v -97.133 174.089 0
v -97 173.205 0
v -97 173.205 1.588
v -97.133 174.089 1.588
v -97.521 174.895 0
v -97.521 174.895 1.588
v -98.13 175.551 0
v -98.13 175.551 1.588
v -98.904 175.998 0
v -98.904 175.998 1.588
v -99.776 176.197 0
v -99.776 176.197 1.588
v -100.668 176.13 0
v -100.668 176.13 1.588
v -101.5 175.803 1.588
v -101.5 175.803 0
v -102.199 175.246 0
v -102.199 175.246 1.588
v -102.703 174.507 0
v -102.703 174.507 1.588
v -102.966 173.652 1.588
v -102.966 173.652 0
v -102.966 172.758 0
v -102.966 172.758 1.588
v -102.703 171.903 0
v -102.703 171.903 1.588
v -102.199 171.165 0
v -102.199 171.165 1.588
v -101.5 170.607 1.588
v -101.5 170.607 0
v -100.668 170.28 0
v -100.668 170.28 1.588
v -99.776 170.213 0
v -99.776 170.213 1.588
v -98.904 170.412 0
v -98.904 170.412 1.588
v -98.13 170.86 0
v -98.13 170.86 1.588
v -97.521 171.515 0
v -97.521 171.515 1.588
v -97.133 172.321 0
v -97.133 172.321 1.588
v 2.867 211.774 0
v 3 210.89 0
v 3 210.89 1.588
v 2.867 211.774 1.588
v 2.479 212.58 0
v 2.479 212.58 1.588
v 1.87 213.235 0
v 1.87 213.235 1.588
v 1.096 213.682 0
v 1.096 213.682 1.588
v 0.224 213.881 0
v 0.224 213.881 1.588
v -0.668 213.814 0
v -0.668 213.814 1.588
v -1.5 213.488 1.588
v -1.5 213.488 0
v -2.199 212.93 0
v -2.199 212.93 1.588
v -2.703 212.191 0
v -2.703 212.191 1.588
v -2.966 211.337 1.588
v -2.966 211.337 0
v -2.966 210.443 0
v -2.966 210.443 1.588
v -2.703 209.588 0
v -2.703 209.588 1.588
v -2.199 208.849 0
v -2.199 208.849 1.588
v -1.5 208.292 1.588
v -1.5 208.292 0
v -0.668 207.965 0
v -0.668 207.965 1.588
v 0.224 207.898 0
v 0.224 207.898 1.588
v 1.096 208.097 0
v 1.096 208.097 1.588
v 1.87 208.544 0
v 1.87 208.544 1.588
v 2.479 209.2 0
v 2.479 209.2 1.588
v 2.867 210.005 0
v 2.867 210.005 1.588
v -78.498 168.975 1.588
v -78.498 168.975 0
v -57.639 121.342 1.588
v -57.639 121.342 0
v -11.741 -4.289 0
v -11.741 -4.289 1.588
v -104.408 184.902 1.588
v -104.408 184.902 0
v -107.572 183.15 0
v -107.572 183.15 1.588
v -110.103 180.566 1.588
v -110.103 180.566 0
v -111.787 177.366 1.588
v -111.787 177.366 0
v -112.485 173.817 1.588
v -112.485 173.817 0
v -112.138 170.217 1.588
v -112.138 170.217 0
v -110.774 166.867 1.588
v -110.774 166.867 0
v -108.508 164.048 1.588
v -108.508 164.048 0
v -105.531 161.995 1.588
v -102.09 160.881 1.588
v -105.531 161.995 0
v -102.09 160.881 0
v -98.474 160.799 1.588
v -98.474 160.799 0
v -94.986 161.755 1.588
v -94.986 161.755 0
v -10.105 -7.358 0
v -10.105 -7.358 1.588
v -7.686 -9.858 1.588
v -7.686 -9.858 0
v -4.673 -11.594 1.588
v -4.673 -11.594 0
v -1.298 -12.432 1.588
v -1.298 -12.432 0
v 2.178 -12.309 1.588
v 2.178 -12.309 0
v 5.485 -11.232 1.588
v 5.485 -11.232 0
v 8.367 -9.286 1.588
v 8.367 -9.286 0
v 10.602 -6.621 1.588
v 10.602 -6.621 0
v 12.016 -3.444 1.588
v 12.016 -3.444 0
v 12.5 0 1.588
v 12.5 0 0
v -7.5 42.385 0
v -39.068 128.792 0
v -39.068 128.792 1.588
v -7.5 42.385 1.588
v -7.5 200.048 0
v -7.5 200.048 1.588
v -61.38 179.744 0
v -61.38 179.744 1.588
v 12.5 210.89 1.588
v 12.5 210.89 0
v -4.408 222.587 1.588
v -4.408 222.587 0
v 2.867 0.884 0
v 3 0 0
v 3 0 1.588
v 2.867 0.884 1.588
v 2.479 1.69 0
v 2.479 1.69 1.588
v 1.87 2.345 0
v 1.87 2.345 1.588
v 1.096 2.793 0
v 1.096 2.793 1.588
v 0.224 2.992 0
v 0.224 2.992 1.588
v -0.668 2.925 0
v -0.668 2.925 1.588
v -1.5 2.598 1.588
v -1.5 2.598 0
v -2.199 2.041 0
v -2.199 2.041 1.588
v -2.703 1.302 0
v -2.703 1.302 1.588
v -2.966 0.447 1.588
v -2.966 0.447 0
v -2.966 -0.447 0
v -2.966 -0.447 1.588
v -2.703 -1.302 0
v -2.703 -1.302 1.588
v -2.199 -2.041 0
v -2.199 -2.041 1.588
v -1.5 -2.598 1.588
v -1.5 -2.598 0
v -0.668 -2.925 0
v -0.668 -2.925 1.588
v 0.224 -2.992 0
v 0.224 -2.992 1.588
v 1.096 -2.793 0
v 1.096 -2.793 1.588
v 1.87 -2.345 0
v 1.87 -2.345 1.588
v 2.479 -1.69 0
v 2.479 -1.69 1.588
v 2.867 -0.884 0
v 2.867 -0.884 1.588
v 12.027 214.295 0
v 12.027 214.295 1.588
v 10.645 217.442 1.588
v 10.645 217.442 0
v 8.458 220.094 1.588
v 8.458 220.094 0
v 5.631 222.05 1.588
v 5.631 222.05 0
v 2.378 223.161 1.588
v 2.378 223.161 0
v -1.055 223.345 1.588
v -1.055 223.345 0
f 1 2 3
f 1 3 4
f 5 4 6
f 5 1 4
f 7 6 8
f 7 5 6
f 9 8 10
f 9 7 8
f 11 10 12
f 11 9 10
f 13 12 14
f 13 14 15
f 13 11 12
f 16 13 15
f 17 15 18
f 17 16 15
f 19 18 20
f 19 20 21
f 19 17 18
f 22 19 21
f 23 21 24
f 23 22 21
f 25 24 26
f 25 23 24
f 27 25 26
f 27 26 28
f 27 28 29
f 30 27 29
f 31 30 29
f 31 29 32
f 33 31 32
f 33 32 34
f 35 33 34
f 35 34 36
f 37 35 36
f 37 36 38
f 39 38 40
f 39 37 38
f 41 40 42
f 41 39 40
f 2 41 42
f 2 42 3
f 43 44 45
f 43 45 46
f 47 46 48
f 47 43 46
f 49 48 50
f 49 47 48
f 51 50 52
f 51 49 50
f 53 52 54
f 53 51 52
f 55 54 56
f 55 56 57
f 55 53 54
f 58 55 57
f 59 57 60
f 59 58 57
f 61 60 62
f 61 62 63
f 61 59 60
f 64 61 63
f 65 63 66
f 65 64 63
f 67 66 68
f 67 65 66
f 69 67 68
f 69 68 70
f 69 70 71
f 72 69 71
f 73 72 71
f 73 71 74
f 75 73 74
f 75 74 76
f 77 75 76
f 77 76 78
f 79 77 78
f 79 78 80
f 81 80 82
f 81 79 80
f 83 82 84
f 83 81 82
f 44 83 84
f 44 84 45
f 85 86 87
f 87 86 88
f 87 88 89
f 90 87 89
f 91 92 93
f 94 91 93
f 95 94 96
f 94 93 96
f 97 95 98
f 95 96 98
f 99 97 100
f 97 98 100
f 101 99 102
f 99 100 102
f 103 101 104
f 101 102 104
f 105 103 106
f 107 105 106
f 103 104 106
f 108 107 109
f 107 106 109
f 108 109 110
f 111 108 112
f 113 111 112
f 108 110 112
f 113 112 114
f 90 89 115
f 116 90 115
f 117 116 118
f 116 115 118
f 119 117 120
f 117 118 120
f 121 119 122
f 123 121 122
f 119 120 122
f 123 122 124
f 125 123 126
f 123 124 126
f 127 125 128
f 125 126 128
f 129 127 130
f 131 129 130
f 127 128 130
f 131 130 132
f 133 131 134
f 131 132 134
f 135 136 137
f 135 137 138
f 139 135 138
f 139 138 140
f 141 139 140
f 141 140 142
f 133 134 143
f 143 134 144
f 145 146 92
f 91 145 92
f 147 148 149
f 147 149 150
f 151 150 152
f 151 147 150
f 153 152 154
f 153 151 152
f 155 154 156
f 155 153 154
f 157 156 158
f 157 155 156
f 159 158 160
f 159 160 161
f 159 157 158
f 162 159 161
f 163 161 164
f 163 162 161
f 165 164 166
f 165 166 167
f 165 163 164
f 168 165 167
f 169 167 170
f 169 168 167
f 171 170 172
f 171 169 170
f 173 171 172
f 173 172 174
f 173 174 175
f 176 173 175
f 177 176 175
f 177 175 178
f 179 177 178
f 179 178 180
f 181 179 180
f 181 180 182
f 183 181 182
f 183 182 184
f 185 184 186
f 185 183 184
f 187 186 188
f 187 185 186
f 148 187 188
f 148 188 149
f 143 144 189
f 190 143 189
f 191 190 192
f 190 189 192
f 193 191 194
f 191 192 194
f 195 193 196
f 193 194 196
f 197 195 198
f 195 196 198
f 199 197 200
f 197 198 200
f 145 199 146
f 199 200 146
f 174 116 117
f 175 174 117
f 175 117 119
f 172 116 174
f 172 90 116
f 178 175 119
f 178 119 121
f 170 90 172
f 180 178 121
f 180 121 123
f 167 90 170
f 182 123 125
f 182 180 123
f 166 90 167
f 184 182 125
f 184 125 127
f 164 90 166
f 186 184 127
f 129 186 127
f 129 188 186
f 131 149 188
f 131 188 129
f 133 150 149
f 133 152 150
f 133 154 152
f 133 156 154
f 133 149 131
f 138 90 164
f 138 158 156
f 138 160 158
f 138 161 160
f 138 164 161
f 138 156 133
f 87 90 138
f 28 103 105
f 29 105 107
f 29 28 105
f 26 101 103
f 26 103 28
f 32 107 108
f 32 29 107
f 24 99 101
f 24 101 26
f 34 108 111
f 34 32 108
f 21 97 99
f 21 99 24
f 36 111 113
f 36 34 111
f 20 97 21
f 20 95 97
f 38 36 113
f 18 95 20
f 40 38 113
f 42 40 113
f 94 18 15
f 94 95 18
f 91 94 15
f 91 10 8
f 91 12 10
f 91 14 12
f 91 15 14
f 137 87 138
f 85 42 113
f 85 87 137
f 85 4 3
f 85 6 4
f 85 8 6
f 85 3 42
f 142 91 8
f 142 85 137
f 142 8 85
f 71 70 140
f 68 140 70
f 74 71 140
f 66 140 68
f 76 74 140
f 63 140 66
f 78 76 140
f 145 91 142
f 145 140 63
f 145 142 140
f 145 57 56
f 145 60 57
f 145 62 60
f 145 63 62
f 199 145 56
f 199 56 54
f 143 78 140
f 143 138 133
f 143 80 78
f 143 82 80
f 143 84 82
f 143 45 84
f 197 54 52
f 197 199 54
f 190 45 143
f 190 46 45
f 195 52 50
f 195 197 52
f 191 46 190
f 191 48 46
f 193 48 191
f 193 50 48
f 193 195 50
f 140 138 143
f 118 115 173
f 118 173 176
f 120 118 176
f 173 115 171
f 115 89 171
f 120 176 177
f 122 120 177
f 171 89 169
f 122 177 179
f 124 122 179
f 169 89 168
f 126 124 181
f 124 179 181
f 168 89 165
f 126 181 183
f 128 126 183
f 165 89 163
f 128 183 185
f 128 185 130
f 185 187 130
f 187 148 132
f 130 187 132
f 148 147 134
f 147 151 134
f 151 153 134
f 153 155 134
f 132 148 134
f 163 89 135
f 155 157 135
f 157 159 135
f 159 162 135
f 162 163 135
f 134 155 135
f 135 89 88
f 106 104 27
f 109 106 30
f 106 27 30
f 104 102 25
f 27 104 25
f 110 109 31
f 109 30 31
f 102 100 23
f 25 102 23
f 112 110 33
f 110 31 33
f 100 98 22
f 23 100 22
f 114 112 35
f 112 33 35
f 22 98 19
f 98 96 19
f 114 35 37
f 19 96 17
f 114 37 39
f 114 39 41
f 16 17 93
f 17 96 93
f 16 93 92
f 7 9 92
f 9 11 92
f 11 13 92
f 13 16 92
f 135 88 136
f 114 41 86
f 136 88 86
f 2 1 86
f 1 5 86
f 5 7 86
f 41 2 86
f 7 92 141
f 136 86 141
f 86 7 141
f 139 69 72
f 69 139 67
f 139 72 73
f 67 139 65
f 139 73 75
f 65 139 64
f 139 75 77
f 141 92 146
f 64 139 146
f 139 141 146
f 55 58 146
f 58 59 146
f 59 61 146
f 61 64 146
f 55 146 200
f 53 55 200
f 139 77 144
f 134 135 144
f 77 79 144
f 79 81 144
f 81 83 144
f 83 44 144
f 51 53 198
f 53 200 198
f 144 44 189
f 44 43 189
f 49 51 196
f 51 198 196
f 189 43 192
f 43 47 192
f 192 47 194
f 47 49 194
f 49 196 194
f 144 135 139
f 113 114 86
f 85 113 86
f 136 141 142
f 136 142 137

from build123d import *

# Parameters (mm, degrees)
SKETCH1_R           = 3
BOSS_EXTRUDE1_DEPTH = 1.5875


with BuildPart() as part:
    # Sketch1 → Boss-Extrude1 (new body)
    with BuildSketch(Plane.XY):
        with BuildLine():
            Line((12.5, 0), (12.5, 210.889668604))
            ThreePointArc((12.5, 210.889668604), (7.111624908, 221.169493076), (-4.407966588, 222.586669526))
            Line((-4.407966588, 222.586669526), (-104.407966588, 184.902081679))
            ThreePointArc((-104.407966588, 184.902081679), (-111.577605538, 168.492432881), (-94.985900649, 161.754805315))
            Line((-94.985900649, 161.754805315), (-78.497504012, 168.975108381))
            Line((-78.497504012, 168.975108381), (-57.638850711, 121.341962542))
            Line((-57.638850711, 121.341962542), (-11.740989728, -4.289424229))
            ThreePointArc((-11.740989728, -4.289424229), (2.17802989, -12.308784903), (12.5, 0))
        make_face()
        with Locations((-100, 173.205080757)):
            Circle(SKETCH1_R, mode=Mode.SUBTRACT)
        with Locations((0, 210.889668604)):
            Circle(SKETCH1_R, mode=Mode.SUBTRACT)
        Circle(SKETCH1_R, mode=Mode.SUBTRACT)
        Polygon((-39.067722995, 128.792048743), (-7.5, 42.385041268), (-7.5, 200.048449538), (-61.37972985, 179.744095411), align=None, mode=Mode.SUBTRACT)
    extrude(amount=BOSS_EXTRUDE1_DEPTH)


solid = part.part
